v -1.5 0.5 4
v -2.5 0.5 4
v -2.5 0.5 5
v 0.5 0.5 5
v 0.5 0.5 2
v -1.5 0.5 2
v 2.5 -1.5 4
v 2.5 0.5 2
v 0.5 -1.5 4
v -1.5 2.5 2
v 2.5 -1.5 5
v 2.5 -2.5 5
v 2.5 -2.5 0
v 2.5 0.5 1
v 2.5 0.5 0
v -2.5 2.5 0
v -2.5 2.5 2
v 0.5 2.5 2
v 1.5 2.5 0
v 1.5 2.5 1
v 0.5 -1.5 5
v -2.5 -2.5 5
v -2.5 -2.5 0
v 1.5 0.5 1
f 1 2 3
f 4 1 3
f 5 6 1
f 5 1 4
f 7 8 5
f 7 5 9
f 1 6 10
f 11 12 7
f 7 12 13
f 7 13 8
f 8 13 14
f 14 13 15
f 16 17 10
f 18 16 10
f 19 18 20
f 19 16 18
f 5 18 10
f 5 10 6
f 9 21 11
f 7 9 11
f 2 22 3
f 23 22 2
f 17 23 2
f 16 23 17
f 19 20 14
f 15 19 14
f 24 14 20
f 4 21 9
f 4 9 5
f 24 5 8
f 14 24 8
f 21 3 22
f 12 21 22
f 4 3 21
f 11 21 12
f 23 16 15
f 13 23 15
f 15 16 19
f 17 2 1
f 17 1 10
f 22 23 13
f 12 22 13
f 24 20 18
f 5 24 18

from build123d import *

# Parameters (mm, degrees)
SKETCH1_W           = 5
SKETCH1_H           = 5
BOSS_EXTRUDE1_DEPTH = 5
CUT_EXTRUDE1_DEPTH  = 2
CUT_EXTRUDE7_DEPTH  = 1
SKETCH6_W           = 2
SKETCH6_H           = 4
CUT_EXTRUDE13_DEPTH = 1
CUT_EXTRUDE14_DEPTH = 2
CUT_EXTRUDE16_DEPTH = 3
CUT_EXTRUDE17_DEPTH = 2


with BuildPart() as part:
    # Sketch1 → Boss-Extrude1 (new body)
    with BuildSketch(Plane.XY):
        Rectangle(SKETCH1_W, SKETCH1_H)
    extrude(amount=BOSS_EXTRUDE1_DEPTH)

    # Sketch2 → Cut-Extrude1 (cut)
    with BuildSketch(Plane(origin=(0, 2.5, 0), x_dir=(1, 0, 0), z_dir=(0, 1, 0))):
        Polygon((-2.5, -5), (0.5, -5), (0.5, -2), (-1.5, -2), (-1.5, -4), (-2.5, -4), align=None)
    extrude(amount=-CUT_EXTRUDE1_DEPTH, mode=Mode.SUBTRACT)

    # Sketch3 → Cut-Extrude7 (cut)
    with BuildSketch(Plane.ZY.offset(2.5)):
        Polygon((4, 0.5), (2, 2.5), (4, 2.5), align=None)
    extrude(amount=-CUT_EXTRUDE7_DEPTH, mode=Mode.SUBTRACT)

    # Sketch6 → Cut-Extrude13 (cut)
    with BuildSketch(Plane.XY.offset(5)):
        with Locations((1.5, 0.5)):
            Rectangle(SKETCH6_W, SKETCH6_H)
    extrude(amount=-CUT_EXTRUDE13_DEPTH, mode=Mode.SUBTRACT)

    # Sketch7 → Cut-Extrude14 (cut)
    with BuildSketch(Plane(origin=(2.5, 0, 0), x_dir=(0, 0, -1), z_dir=(1, 0, 0))):
        Polygon((-4, 2.5), (-2, 2.5), (-2, 0.5), (-4, -1.5), align=None)
    extrude(amount=-CUT_EXTRUDE14_DEPTH, mode=Mode.SUBTRACT)

    # Sketch8 → Cut-Extrude16 (cut, through all)
    with BuildSketch(Plane.XY.offset(2)):
        Polygon((2.5, 2.5), (1.5, 2.5), (2.5, 0.5), align=None)
    extrude(amount=-CUT_EXTRUDE16_DEPTH, mode=Mode.SUBTRACT)

    # Sketch10 → Cut-Extrude17 (cut)
    with BuildSketch(Plane(origin=(0, 2.5, 0), x_dir=(1, 0, 0), z_dir=(0, 1, 0))):
        Polygon((2.5, -2), (2.5, -1), (1.5, -1), (0.5, -2), align=None)
    extrude(amount=-CUT_EXTRUDE17_DEPTH, mode=Mode.SUBTRACT)


solid = part.part
